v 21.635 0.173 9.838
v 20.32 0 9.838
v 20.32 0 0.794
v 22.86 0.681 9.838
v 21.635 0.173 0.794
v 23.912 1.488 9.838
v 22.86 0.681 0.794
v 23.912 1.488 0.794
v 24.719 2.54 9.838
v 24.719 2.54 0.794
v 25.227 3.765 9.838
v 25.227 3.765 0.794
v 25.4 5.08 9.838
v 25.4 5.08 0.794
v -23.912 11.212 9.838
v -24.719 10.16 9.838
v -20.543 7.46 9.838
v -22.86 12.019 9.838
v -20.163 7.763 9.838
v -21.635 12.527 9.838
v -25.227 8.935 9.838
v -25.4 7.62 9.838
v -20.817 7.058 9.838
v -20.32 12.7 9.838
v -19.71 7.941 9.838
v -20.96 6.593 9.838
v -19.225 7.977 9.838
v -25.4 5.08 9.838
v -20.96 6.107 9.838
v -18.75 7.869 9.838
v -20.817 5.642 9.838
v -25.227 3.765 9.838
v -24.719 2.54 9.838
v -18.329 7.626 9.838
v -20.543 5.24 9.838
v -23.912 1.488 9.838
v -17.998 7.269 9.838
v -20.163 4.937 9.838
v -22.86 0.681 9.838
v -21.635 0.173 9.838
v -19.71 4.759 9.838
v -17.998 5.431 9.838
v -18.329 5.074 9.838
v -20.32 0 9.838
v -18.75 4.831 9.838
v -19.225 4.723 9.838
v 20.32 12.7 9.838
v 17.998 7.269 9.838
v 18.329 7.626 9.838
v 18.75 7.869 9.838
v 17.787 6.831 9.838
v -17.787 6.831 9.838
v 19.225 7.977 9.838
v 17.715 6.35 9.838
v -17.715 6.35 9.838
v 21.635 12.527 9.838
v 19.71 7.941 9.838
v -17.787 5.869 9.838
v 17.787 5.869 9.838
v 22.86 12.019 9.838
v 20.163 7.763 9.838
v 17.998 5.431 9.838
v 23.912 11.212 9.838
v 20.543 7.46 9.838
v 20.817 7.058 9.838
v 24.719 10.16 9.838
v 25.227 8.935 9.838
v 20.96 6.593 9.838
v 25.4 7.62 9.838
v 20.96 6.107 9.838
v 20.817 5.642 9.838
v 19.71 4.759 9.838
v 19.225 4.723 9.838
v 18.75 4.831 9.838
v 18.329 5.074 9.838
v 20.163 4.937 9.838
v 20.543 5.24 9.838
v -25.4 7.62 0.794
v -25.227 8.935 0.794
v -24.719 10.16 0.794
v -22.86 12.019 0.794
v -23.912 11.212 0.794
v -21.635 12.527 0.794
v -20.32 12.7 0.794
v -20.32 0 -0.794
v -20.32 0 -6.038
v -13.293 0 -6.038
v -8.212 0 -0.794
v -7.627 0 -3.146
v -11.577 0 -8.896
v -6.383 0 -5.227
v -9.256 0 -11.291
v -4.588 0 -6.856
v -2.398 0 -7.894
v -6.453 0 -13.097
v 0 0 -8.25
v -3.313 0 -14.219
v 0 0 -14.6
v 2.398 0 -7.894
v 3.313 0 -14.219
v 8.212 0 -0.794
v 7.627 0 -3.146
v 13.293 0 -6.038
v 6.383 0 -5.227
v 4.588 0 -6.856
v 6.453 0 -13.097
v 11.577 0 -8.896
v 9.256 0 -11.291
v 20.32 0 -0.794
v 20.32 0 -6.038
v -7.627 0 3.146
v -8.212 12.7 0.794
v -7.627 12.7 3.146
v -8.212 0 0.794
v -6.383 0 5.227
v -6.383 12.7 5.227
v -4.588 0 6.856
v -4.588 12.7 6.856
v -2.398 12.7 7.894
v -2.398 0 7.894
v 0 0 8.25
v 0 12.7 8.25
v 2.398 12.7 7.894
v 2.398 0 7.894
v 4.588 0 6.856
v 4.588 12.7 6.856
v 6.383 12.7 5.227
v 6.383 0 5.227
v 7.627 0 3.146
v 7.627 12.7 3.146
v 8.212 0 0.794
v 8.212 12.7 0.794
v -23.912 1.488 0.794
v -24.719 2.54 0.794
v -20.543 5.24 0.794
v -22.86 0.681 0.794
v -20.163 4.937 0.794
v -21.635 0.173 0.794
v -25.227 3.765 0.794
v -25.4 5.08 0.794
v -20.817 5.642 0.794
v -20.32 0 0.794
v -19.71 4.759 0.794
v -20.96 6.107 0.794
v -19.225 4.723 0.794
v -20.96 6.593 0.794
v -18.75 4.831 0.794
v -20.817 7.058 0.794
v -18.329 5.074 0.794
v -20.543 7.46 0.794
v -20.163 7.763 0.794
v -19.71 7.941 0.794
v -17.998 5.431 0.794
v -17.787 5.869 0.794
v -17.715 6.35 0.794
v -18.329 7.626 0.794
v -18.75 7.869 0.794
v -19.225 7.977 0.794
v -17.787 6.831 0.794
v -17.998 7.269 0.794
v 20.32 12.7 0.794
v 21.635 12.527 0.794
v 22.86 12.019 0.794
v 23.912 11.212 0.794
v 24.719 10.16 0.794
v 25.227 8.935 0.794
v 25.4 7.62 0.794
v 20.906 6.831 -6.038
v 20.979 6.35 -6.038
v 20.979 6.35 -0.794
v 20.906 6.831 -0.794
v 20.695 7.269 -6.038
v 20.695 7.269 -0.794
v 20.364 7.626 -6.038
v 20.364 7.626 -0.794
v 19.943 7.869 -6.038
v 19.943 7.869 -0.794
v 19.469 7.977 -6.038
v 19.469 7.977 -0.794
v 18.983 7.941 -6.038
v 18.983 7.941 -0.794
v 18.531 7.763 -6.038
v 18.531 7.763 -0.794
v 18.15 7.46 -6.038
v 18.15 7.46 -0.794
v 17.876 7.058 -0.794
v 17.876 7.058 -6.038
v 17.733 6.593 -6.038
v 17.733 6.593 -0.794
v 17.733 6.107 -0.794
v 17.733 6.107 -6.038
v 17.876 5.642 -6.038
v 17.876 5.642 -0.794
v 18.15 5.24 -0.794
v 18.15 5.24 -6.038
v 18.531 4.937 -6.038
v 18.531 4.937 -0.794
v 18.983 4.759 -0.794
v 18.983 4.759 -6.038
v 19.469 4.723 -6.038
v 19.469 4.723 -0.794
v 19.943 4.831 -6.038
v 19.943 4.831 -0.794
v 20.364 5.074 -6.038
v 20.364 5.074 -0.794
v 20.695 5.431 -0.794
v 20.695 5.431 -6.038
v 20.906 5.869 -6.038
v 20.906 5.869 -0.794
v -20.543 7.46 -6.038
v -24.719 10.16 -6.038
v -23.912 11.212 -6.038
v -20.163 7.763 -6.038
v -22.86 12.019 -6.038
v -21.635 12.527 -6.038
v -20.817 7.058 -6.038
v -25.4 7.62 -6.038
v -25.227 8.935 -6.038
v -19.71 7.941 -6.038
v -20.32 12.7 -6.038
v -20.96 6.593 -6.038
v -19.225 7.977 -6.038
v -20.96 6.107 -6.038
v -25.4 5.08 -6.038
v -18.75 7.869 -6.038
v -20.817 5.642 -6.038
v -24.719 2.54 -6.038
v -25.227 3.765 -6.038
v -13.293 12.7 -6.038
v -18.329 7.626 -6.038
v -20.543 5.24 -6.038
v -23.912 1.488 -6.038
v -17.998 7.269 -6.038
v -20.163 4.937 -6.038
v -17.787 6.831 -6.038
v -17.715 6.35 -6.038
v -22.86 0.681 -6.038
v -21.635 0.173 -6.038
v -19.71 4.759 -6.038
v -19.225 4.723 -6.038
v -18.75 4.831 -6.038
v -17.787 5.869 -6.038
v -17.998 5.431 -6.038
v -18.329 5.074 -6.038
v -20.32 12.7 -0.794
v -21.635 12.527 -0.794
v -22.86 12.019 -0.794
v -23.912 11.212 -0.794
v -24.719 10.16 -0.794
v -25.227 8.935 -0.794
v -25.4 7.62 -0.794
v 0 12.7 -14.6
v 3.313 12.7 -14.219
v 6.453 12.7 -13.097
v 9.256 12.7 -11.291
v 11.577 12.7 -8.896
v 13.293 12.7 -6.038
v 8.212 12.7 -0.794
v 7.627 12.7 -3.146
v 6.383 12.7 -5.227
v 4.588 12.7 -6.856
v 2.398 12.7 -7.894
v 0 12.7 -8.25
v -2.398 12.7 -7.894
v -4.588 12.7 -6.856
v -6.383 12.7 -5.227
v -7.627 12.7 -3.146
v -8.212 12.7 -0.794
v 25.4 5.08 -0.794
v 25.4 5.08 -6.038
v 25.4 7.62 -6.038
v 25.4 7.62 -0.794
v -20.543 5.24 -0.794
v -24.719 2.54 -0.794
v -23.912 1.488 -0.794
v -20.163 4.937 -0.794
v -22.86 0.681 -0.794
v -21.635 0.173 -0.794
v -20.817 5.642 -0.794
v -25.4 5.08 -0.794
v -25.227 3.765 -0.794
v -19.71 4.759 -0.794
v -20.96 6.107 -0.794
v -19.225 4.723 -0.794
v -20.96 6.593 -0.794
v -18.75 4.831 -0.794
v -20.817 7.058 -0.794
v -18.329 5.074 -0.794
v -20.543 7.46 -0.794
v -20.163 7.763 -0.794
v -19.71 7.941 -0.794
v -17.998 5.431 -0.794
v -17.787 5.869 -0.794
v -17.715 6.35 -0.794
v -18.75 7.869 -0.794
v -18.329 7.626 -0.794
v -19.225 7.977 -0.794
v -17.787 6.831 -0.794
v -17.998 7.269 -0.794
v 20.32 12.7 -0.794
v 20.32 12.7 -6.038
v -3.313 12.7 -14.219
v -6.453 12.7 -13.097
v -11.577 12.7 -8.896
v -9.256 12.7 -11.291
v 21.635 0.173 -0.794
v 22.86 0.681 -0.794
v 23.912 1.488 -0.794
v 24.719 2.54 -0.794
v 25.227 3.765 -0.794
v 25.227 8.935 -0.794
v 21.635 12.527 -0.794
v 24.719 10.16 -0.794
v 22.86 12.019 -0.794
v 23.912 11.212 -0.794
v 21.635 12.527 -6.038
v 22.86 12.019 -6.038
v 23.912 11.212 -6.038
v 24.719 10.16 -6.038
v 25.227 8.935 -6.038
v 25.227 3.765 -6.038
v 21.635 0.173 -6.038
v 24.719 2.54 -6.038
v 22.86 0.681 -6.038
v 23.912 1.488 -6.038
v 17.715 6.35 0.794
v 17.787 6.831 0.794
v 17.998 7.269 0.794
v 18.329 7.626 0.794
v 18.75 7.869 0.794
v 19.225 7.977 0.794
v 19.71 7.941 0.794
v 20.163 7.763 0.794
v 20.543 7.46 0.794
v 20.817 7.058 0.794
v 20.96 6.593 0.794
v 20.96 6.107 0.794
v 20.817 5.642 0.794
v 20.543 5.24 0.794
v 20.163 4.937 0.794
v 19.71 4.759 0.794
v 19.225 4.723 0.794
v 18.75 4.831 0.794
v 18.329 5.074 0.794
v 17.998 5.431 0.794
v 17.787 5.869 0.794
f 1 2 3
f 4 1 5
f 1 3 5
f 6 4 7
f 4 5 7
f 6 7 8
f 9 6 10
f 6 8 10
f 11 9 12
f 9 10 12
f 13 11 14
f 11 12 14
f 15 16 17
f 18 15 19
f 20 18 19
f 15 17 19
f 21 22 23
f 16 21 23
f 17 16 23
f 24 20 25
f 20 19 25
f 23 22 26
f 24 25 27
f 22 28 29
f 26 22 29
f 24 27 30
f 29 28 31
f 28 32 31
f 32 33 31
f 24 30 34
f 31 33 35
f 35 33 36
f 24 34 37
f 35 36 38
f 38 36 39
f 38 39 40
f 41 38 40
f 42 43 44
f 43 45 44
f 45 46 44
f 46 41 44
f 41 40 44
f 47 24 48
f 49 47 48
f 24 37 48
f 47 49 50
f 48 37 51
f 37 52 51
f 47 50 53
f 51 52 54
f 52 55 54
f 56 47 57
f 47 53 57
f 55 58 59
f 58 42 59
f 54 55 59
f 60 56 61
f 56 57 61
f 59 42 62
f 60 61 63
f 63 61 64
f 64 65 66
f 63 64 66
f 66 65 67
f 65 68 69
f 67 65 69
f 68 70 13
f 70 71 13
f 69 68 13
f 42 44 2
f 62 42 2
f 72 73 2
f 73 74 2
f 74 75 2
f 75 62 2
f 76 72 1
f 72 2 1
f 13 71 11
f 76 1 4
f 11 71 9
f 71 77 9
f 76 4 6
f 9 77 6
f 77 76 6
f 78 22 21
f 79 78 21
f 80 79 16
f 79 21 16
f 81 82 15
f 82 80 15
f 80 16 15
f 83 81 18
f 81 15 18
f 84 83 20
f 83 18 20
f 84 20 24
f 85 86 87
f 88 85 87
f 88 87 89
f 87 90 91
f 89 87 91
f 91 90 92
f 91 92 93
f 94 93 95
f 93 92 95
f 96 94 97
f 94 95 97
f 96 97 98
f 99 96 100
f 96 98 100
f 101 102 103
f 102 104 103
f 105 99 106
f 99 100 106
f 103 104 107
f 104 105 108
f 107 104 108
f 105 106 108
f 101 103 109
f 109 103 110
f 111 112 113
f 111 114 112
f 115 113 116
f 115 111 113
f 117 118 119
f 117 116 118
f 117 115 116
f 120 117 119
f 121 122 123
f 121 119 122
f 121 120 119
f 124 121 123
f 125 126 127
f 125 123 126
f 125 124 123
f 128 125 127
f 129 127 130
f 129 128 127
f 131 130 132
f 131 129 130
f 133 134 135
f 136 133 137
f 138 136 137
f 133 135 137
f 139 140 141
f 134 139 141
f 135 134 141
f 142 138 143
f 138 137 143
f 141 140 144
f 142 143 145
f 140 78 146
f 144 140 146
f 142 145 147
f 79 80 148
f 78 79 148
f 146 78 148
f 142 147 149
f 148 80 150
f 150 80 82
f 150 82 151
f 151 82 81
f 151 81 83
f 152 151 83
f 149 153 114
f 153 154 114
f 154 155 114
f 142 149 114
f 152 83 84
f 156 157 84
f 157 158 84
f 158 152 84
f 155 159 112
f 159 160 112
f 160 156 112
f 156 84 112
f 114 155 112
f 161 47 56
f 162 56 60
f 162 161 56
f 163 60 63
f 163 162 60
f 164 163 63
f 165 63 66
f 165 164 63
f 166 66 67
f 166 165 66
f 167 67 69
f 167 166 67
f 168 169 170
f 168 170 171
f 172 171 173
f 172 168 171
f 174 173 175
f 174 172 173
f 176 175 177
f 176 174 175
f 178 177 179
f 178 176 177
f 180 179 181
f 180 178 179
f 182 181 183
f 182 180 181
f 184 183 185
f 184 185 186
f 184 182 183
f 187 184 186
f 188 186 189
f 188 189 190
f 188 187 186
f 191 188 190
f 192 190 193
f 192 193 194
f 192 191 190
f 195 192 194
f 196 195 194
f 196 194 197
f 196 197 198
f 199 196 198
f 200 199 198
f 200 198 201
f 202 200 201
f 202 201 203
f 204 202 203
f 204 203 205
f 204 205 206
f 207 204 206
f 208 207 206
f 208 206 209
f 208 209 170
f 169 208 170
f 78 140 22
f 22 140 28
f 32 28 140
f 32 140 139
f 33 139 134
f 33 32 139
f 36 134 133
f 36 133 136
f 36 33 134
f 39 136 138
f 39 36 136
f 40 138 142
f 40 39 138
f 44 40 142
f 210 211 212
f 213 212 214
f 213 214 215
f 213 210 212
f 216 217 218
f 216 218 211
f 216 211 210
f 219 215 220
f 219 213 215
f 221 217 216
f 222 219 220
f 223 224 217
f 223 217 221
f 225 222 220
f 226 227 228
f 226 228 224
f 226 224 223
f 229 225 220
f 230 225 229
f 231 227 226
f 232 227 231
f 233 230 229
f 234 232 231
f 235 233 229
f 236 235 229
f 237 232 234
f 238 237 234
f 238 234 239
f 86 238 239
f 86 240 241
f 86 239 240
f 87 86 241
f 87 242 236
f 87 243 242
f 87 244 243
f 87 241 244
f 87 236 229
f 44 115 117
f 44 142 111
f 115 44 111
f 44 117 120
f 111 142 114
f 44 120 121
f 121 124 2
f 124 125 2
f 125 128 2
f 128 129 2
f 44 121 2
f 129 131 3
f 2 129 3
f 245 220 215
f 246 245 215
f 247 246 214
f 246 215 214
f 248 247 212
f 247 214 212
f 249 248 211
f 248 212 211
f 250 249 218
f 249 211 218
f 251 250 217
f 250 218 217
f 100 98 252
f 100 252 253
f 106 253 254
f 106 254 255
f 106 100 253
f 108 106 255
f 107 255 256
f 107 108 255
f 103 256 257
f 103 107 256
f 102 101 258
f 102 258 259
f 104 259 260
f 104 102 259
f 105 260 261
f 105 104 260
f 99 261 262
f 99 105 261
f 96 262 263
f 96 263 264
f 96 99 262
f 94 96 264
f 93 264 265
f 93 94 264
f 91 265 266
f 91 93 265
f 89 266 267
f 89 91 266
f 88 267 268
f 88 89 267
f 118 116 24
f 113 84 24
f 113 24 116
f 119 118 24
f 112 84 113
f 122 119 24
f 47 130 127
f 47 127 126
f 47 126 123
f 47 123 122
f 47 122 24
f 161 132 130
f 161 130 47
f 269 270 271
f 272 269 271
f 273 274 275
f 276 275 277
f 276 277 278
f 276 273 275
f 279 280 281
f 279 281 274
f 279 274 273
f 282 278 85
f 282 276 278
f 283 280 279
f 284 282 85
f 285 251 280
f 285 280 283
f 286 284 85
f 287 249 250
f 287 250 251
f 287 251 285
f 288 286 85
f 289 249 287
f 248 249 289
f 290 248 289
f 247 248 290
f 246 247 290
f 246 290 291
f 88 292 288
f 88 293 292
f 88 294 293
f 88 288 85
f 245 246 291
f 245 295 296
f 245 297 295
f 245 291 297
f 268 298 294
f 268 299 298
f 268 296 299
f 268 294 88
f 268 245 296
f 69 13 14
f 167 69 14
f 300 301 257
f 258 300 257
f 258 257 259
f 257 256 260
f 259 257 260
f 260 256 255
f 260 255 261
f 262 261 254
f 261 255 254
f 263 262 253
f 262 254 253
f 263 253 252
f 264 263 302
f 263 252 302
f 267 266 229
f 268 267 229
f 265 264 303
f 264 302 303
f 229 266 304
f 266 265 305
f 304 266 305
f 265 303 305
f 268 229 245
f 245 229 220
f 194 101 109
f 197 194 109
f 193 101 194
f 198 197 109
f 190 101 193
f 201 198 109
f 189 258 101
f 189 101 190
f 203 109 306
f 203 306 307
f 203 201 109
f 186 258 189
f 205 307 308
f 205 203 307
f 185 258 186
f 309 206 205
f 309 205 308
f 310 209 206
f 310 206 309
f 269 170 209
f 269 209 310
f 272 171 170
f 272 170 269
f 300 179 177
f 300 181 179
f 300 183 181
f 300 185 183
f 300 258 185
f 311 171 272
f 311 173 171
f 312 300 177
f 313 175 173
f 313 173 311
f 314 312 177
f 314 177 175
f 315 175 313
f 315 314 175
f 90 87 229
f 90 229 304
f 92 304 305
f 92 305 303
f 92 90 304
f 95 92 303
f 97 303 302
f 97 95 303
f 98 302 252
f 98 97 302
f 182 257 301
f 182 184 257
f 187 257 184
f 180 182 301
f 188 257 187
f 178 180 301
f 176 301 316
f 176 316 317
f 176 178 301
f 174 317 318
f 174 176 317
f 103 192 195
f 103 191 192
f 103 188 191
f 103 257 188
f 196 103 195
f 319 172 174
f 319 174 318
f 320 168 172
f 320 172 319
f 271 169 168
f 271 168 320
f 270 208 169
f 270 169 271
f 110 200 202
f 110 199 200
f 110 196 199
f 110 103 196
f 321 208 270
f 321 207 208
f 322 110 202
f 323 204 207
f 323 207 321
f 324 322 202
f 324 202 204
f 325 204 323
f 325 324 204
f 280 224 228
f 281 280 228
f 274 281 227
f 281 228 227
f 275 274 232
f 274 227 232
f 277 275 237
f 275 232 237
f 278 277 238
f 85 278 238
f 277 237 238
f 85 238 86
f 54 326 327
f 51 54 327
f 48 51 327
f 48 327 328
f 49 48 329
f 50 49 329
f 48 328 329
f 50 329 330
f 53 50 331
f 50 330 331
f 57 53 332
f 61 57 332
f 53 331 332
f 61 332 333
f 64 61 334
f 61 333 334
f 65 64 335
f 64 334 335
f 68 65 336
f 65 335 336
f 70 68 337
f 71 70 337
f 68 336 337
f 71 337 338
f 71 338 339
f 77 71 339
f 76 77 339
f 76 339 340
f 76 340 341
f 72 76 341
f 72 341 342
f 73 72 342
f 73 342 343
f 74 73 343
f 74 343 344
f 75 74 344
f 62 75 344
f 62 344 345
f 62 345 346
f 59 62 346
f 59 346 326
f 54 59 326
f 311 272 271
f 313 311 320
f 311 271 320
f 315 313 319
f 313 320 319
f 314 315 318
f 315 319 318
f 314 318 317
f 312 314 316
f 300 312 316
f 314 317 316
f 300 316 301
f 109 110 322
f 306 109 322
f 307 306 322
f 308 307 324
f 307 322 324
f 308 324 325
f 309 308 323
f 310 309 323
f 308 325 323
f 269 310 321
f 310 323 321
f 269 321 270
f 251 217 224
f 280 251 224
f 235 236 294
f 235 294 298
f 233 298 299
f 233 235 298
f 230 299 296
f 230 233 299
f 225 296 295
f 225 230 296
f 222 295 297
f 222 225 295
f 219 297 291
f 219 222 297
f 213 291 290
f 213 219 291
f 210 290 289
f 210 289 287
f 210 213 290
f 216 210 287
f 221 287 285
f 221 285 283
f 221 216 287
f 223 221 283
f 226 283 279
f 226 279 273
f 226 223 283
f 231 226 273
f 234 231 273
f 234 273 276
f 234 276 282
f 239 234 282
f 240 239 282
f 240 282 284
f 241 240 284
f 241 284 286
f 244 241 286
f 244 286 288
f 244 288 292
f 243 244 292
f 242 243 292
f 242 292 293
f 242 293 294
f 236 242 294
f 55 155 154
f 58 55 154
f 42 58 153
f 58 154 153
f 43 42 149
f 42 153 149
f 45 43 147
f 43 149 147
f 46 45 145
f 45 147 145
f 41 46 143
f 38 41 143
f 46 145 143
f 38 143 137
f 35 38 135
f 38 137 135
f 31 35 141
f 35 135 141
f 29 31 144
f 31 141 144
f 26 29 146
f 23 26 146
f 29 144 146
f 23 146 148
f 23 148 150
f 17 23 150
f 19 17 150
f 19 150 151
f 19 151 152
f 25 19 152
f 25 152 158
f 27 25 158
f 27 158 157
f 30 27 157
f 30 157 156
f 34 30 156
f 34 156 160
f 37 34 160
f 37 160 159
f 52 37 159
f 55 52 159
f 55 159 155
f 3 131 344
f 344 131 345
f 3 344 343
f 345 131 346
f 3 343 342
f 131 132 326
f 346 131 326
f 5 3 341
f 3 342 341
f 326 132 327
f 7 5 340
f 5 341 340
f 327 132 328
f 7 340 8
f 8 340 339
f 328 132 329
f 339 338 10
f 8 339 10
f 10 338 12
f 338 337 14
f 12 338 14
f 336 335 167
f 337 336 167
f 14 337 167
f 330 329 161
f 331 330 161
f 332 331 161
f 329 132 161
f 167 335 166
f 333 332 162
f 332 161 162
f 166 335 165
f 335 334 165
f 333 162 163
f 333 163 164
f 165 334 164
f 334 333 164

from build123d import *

# Parameters (mm, degrees)
SKETCH1_R           = 8.25
BOSS_EXTRUDE1_DEPTH = 12.7
SKETCH6_R           = 1.63195
CUT_EXTRUDE1_DEPTH  = 33.534068682
FILLET1_R           = 5.08
SPLIT2_START        = -14.6
SPLIT2_OUTLINE_R    = 1.63195
SPLIT2_DEPTH        = 13.80625
SPLIT2_2_DEPTH      = 12.7
SPLIT2_START_2      = -16
SPLIT2_3_OUTLINE_R  = 1.63195
SPLIT2_3_DEPTH      = 16.79375
SPLIT2_4_DEPTH      = 12.7
SPLIT2_START_3      = -0.79375
SPLIT2_5_OUTLINE_R  = 1.63195
SPLIT2_5_DEPTH      = 1.5875
SPLIT2_6_DEPTH      = 12.7
SPLIT2_7_OUTLINE_R  = 1.63195
SPLIT2_7_DEPTH      = 1.5875


with BuildPart() as part:
    # Sketch1 → Boss-Extrude1 (new body)
    with BuildSketch(Plane(origin=(0, 0, 0), x_dir=(1, 0, 0), z_dir=(0, 1, 0))):
        with BuildLine():
            Line((-25.4, -9.8375), (25.4, -9.8375))
            Line((25.4, -9.8375), (25.4, 6.0375))
            Line((25.4, 6.0375), (13.293178467, 6.0375))
            ThreePointArc((13.293178467, 6.0375), (0, 14.6), (-13.293178467, 6.0375))
            Line((-13.293178467, 6.0375), (-25.4, 6.0375))
            Line((-25.4, 6.0375), (-25.4, -9.8375))
        make_face()
        with Locations(Location((0, 0, 0), (0, 0, 270))):
            Circle(SKETCH1_R, mode=Mode.SUBTRACT)
    extrude(amount=BOSS_EXTRUDE1_DEPTH)

    # Sketch6 → Cut-Extrude1 (cut, through all)
    with BuildSketch(Plane(origin=(0, 0, -6.0375), x_dir=(-1, 0, 0), z_dir=(0, 0, -1))):
        with Locations((-19.346589233, 6.35)):
            Circle(SKETCH6_R)
        with Locations(Location((19.346589233, 6.35, 0), (0, 0, 180))):
            Circle(SKETCH6_R)
    extrude(amount=-CUT_EXTRUDE1_DEPTH, mode=Mode.SUBTRACT)

    # Fillet1
    fillet1_edges = [part.edges().sort_by_distance(p)[0] for p in [
        (-25.4, 12.7, 1.9),
        (25.4, 12.7, 1.9),
        (-25.4, 0, 1.9),
        (25.4, 0, 1.9),
    ]]
    fillet(fillet1_edges, radius=FILLET1_R)

    # Split2 3 outline → Split2 3 (cut)
    with BuildSketch(Plane.XY.offset(SPLIT2_START_2)):
        with BuildLine():
            ThreePointArc((25.4, 7.62), (23.912102448, 11.212102448), (20.32, 12.7))
            Line((20.32, 12.7), (-20.32, 12.7))
            ThreePointArc((-20.32, 12.7), (-23.912102448, 11.212102448), (-25.4, 7.62))
            Line((-25.4, 7.62), (-25.4, 5.08))
            ThreePointArc((-25.4, 5.08), (-23.912102448, 1.487897552), (-20.32, 0))
            Line((-20.32, 0), (20.32, 0))
            ThreePointArc((20.32, 0), (23.912102448, 1.487897552), (25.4, 5.08))
            Line((25.4, 5.08), (25.4, 7.62))
        make_face()
        with Locations((-19.346589233, 6.35)):
            Circle(SPLIT2_3_OUTLINE_R, mode=Mode.SUBTRACT)
        with Locations((19.346589233, 6.35)):
            Circle(SPLIT2_3_OUTLINE_R, mode=Mode.SUBTRACT)
    extrude(amount=SPLIT2_3_DEPTH, mode=Mode.SUBTRACT)


with BuildPart() as body_2:
    # Split2: read off the stored shape, not the designer's step
    # Split2 outline → Split2 (new body)
    with BuildSketch(Plane.XY.offset(SPLIT2_START)):
        with BuildLine():
            Line((-20.32, 0), (20.32, 0))
            ThreePointArc((20.32, 0), (23.912102448, 1.487897552), (25.4, 5.08))
            Line((25.4, 5.08), (25.4, 7.62))
            ThreePointArc((25.4, 7.62), (23.912102448, 11.212102448), (20.32, 12.7))
            Line((20.32, 12.7), (-20.32, 12.7))
            ThreePointArc((-20.32, 12.7), (-23.912102448, 11.212102448), (-25.4, 7.62))
            Line((-25.4, 7.62), (-25.4, 5.08))
            ThreePointArc((-25.4, 5.08), (-23.912102448, 1.487897552), (-20.32, 0))
        make_face()
        with Locations((-19.346589233, 6.35)):
            Circle(SPLIT2_OUTLINE_R, mode=Mode.SUBTRACT)
        with Locations((19.346589233, 6.35)):
            Circle(SPLIT2_OUTLINE_R, mode=Mode.SUBTRACT)
    extrude(amount=SPLIT2_DEPTH)

    # Split2 2 outline → Split2 2 (cut)
    with BuildSketch(Plane(origin=(0, 0, 0), x_dir=(1, 0, 0), z_dir=(0, 1, 0))):
        with BuildLine():
            Line((-25.4, 6.0375), (-13.293178467, 6.0375))
            ThreePointArc((-13.293178467, 6.0375), (-7.906089425, 12.274108929), (0, 14.6))
            Line((0, 14.6), (-25.4, 14.6))
            Line((-25.4, 14.6), (-25.4, 6.0375))
        make_face()
        with BuildLine():
            Line((25.4, 14.6), (0, 14.6))
            ThreePointArc((0, 14.6), (7.906089425, 12.274108929), (13.293178467, 6.0375))
            Line((13.293178467, 6.0375), (25.4, 6.0375))
            Line((25.4, 6.0375), (25.4, 14.6))
        make_face()
        with BuildLine():
            ThreePointArc((8.211727037, 0.79375), (0, 8.25), (-8.211727037, 0.79375))
            Line((-8.211727037, 0.79375), (8.211727037, 0.79375))
        make_face()
    extrude(amount=SPLIT2_2_DEPTH, mode=Mode.SUBTRACT)


with BuildPart() as body_3:
    # Split2 4 outline → Split2 4 (new body)
    with BuildSketch(Plane(origin=(0, 0, 0), x_dir=(1, 0, 0), z_dir=(0, 1, 0))):
        with BuildLine():
            Line((25.4, 0.79375), (8.211727037, 0.79375))
            ThreePointArc((8.211727037, 0.79375), (8.25, 0), (8.211727037, -0.79375))
            Line((8.211727037, -0.79375), (25.4, -0.79375))
            Line((25.4, -0.79375), (25.4, 0.79375))
        make_face()
    extrude(amount=SPLIT2_4_DEPTH)

    # Split2 5 outline → Split2 5 (cut)
    with BuildSketch(Plane.XY.offset(SPLIT2_START_3)):
        with BuildLine():
            ThreePointArc((20.32, 12.7), (23.912102448, 11.212102448), (25.4, 7.62))
            Line((25.4, 7.62), (25.4, 12.7))
            Line((25.4, 12.7), (20.32, 12.7))
        make_face()
        with BuildLine():
            Line((25.4, 0), (25.4, 5.08))
            ThreePointArc((25.4, 5.08), (23.912102448, 1.487897552), (20.32, 0))
            Line((20.32, 0), (25.4, 0))
        make_face()
        with Locations((19.346589233, 6.35)):
            Circle(SPLIT2_5_OUTLINE_R)
    extrude(amount=SPLIT2_5_DEPTH, mode=Mode.SUBTRACT)


with BuildPart() as body_4:
    # Split2 6 outline → Split2 6 (new body)
    with BuildSketch(Plane(origin=(0, 0, 0), x_dir=(1, 0, 0), z_dir=(0, 1, 0))):
        with BuildLine():
            Line((-8.211727037, 0.79375), (-25.4, 0.79375))
            Line((-25.4, 0.79375), (-25.4, -0.79375))
            Line((-25.4, -0.79375), (-8.211727037, -0.79375))
            ThreePointArc((-8.211727037, -0.79375), (-8.25, 0), (-8.211727037, 0.79375))
        make_face()
    extrude(amount=SPLIT2_6_DEPTH)

    # Split2 7 outline → Split2 7 (cut)
    with BuildSketch(Plane.XY.offset(SPLIT2_START_3)):
        with BuildLine():
            Line((-25.4, 12.7), (-25.4, 7.62))
            ThreePointArc((-25.4, 7.62), (-23.912102448, 11.212102448), (-20.32, 12.7))
            Line((-20.32, 12.7), (-25.4, 12.7))
        make_face()
        with BuildLine():
            ThreePointArc((-20.32, 0), (-23.912102448, 1.487897552), (-25.4, 5.08))
            Line((-25.4, 5.08), (-25.4, 0))
            Line((-25.4, 0), (-20.32, 0))
        make_face()
        with Locations((-19.346589233, 6.35)):
            Circle(SPLIT2_7_OUTLINE_R)
    extrude(amount=SPLIT2_7_DEPTH, mode=Mode.SUBTRACT)


solid = Compound([part.part, body_2.part])
